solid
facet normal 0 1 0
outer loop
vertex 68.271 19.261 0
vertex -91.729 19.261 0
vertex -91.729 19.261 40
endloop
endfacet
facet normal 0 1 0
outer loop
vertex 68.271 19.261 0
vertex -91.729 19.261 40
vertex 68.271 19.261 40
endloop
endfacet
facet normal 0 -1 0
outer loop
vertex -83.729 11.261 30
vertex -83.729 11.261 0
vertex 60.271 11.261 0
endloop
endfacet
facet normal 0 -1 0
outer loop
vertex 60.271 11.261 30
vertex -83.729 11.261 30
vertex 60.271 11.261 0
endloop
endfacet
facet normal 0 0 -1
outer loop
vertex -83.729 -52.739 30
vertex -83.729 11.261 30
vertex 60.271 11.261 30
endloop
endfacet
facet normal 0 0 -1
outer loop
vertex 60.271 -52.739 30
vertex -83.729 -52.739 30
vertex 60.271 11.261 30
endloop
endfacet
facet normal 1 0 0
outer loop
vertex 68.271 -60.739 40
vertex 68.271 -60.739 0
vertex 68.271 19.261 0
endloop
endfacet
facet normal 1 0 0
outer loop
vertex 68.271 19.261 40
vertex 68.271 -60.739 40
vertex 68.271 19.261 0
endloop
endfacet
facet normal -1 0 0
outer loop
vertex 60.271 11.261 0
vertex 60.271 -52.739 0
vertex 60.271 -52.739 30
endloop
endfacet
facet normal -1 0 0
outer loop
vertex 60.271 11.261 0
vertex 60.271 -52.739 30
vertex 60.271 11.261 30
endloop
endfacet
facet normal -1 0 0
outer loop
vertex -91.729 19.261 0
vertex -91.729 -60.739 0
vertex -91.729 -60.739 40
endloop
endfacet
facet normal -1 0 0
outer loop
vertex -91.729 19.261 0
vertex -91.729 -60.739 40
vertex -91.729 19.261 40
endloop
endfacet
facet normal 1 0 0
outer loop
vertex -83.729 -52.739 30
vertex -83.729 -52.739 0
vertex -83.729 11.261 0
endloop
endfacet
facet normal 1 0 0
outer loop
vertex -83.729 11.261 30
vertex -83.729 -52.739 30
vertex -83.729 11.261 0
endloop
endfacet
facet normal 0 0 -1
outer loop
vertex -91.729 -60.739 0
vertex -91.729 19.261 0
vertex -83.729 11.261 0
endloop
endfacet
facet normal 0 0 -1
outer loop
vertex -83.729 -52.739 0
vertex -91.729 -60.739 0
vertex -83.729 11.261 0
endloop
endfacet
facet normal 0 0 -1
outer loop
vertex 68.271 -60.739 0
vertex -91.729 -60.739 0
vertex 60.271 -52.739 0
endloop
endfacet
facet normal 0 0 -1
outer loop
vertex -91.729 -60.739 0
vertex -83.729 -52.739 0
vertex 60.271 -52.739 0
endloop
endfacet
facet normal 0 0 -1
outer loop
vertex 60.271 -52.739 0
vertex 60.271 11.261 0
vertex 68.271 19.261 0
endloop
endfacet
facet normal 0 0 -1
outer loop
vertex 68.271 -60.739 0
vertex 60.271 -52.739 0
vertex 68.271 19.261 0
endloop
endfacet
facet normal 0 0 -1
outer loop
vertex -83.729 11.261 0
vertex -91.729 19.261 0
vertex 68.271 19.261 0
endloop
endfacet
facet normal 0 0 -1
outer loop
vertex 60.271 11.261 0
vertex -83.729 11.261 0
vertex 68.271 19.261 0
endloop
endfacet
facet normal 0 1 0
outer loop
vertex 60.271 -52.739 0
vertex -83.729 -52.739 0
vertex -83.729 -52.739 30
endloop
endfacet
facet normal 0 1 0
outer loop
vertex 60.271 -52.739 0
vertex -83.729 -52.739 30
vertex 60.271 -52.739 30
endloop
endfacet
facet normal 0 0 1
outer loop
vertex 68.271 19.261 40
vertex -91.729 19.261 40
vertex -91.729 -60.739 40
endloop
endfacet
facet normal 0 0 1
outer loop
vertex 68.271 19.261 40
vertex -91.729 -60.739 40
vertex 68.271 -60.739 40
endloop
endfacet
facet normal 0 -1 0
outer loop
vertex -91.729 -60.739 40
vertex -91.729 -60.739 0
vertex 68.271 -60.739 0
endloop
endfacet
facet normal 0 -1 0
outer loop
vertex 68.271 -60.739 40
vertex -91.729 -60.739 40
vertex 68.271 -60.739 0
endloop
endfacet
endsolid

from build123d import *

# Parameters (mm, degrees)
F0_W     = 160
F0_H     = 80
F1_DEPTH = 40
F2_W     = 144
F2_H     = 64
F3_DEPTH = 30


with BuildPart() as f1:
    # F0 (on Top) → F1 (new body)
    with BuildSketch(Plane.XY):
        with Locations((-11.728724, -20.738534)):
            Rectangle(F0_W, F0_H)
    extrude(amount=F1_DEPTH)

    # F2 (on Top) → F3 (cut)
    with BuildSketch(Plane.XY):
        with Locations((-11.728724, -20.738534)):
            Rectangle(F2_W, F2_H)
    extrude(amount=F3_DEPTH, mode=Mode.SUBTRACT)


solid = f1.part
